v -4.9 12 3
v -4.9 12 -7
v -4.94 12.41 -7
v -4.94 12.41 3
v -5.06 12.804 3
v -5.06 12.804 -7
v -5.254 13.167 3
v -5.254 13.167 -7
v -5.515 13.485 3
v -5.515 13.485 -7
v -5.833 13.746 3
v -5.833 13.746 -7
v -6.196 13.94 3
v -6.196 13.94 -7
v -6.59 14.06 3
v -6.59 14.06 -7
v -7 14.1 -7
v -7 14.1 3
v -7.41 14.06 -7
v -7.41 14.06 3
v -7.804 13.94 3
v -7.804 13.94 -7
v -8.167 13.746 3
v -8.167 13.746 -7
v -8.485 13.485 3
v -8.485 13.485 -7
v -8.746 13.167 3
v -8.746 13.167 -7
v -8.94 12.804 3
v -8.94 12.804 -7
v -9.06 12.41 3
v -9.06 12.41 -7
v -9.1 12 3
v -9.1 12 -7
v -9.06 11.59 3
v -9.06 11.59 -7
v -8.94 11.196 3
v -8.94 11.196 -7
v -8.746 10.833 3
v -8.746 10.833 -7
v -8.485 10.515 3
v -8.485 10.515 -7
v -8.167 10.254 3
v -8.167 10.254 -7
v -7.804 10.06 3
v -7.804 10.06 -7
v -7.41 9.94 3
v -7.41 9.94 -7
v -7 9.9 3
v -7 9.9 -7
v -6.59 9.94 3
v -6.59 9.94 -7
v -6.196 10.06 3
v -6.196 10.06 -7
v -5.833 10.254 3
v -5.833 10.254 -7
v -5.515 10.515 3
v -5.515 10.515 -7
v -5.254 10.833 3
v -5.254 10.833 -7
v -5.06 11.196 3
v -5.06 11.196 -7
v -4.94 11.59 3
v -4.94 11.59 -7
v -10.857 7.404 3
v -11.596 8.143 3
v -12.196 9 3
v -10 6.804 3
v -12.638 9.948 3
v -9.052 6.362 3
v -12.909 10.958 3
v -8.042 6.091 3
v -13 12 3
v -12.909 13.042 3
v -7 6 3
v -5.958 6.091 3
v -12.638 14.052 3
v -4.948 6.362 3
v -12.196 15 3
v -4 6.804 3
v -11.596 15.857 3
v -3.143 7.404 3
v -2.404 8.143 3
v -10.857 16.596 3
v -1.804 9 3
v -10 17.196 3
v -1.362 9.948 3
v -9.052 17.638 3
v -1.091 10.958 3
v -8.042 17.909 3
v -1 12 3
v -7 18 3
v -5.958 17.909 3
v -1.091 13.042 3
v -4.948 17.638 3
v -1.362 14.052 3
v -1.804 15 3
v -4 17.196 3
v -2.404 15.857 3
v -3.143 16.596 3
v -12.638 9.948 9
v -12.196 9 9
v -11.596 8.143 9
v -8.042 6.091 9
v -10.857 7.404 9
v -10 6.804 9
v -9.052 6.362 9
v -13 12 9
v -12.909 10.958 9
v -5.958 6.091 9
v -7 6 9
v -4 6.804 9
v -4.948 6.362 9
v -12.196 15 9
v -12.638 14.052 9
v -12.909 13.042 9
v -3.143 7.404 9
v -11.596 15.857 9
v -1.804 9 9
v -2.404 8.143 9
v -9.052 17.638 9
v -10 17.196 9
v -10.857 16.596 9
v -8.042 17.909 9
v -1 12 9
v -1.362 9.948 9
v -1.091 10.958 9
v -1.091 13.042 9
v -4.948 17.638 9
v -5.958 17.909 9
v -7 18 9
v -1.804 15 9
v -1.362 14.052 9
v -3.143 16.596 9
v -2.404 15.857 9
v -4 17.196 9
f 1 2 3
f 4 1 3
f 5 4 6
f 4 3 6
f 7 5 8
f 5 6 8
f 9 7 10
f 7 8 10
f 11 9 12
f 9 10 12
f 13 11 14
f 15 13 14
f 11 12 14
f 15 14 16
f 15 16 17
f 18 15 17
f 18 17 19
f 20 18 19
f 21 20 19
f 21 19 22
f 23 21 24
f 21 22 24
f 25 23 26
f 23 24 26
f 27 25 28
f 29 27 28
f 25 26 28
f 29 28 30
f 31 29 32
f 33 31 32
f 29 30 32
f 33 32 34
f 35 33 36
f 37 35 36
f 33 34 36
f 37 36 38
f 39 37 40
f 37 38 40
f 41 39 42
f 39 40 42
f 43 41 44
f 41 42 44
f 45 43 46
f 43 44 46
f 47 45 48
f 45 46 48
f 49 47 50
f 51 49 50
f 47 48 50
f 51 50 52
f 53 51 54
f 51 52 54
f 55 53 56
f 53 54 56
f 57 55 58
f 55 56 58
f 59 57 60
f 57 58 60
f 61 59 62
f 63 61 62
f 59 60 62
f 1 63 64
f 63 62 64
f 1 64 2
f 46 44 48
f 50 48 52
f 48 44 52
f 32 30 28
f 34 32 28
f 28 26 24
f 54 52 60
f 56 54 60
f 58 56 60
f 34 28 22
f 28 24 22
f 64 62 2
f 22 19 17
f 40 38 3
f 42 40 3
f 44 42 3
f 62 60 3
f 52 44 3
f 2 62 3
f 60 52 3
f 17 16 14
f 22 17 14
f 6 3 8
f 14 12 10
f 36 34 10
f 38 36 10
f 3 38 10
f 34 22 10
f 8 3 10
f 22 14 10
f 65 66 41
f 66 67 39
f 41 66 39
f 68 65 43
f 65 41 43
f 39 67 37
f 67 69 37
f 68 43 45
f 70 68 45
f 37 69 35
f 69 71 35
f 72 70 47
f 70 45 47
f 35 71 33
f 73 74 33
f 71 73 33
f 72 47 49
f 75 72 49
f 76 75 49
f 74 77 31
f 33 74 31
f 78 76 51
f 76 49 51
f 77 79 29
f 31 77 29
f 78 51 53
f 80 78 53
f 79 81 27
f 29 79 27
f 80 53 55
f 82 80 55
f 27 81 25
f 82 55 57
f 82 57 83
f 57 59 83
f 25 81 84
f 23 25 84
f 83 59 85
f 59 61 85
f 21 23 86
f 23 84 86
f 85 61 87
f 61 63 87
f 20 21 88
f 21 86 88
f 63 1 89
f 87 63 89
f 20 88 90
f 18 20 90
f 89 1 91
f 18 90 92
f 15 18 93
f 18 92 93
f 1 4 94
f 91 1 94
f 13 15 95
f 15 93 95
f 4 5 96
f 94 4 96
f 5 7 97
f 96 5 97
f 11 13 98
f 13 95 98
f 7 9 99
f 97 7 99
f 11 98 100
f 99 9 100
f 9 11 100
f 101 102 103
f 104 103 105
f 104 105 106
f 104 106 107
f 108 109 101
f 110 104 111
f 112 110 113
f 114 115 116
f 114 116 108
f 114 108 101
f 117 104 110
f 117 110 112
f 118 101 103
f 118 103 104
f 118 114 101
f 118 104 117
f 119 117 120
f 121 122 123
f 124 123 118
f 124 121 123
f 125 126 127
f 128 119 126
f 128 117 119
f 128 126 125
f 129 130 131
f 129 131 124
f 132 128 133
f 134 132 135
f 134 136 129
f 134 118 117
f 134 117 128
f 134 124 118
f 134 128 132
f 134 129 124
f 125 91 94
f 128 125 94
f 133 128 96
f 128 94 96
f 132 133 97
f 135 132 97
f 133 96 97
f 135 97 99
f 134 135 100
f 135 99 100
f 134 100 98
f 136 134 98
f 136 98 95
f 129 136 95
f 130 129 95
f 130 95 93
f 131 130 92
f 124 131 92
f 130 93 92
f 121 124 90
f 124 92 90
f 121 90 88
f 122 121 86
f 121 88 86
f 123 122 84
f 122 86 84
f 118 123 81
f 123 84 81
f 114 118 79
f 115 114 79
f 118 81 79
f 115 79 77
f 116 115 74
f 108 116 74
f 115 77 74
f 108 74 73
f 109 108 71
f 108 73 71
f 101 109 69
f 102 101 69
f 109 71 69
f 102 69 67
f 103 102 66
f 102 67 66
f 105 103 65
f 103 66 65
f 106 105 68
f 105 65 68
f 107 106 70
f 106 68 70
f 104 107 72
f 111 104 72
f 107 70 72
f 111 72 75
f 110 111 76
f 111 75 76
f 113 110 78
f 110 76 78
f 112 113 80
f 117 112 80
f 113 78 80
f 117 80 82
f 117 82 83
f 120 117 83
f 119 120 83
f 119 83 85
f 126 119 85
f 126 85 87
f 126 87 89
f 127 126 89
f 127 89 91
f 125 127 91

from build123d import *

# Parameters (mm, degrees)
CYLINDER021_R     = 6
CYLINDER021_DEPTH = 6
CYLINDER020_R     = 2.1
CYLINDER020_DEPTH = 10


with BuildPart() as cylinder021:
    # Cylinder021 → Cylinder021 (new body)
    with BuildSketch(Plane.XY.offset(10)):
        Circle(CYLINDER021_R)
    extrude(amount=CYLINDER021_DEPTH)


with BuildPart() as fusion004:
    # Cylinder020 → Cylinder020 (new body)
    with BuildSketch(Plane.XY):
        Circle(CYLINDER020_R)
    extrude(amount=CYLINDER020_DEPTH)

    # Fusion004: union Cylinder021
    add(cylinder021.part)


with BuildPart() as fusion004_1:
    # Fusion004 placement: moved
    add(fusion004.part.moved(Location((-7, 12, -7))))


solid = fusion004_1.part
